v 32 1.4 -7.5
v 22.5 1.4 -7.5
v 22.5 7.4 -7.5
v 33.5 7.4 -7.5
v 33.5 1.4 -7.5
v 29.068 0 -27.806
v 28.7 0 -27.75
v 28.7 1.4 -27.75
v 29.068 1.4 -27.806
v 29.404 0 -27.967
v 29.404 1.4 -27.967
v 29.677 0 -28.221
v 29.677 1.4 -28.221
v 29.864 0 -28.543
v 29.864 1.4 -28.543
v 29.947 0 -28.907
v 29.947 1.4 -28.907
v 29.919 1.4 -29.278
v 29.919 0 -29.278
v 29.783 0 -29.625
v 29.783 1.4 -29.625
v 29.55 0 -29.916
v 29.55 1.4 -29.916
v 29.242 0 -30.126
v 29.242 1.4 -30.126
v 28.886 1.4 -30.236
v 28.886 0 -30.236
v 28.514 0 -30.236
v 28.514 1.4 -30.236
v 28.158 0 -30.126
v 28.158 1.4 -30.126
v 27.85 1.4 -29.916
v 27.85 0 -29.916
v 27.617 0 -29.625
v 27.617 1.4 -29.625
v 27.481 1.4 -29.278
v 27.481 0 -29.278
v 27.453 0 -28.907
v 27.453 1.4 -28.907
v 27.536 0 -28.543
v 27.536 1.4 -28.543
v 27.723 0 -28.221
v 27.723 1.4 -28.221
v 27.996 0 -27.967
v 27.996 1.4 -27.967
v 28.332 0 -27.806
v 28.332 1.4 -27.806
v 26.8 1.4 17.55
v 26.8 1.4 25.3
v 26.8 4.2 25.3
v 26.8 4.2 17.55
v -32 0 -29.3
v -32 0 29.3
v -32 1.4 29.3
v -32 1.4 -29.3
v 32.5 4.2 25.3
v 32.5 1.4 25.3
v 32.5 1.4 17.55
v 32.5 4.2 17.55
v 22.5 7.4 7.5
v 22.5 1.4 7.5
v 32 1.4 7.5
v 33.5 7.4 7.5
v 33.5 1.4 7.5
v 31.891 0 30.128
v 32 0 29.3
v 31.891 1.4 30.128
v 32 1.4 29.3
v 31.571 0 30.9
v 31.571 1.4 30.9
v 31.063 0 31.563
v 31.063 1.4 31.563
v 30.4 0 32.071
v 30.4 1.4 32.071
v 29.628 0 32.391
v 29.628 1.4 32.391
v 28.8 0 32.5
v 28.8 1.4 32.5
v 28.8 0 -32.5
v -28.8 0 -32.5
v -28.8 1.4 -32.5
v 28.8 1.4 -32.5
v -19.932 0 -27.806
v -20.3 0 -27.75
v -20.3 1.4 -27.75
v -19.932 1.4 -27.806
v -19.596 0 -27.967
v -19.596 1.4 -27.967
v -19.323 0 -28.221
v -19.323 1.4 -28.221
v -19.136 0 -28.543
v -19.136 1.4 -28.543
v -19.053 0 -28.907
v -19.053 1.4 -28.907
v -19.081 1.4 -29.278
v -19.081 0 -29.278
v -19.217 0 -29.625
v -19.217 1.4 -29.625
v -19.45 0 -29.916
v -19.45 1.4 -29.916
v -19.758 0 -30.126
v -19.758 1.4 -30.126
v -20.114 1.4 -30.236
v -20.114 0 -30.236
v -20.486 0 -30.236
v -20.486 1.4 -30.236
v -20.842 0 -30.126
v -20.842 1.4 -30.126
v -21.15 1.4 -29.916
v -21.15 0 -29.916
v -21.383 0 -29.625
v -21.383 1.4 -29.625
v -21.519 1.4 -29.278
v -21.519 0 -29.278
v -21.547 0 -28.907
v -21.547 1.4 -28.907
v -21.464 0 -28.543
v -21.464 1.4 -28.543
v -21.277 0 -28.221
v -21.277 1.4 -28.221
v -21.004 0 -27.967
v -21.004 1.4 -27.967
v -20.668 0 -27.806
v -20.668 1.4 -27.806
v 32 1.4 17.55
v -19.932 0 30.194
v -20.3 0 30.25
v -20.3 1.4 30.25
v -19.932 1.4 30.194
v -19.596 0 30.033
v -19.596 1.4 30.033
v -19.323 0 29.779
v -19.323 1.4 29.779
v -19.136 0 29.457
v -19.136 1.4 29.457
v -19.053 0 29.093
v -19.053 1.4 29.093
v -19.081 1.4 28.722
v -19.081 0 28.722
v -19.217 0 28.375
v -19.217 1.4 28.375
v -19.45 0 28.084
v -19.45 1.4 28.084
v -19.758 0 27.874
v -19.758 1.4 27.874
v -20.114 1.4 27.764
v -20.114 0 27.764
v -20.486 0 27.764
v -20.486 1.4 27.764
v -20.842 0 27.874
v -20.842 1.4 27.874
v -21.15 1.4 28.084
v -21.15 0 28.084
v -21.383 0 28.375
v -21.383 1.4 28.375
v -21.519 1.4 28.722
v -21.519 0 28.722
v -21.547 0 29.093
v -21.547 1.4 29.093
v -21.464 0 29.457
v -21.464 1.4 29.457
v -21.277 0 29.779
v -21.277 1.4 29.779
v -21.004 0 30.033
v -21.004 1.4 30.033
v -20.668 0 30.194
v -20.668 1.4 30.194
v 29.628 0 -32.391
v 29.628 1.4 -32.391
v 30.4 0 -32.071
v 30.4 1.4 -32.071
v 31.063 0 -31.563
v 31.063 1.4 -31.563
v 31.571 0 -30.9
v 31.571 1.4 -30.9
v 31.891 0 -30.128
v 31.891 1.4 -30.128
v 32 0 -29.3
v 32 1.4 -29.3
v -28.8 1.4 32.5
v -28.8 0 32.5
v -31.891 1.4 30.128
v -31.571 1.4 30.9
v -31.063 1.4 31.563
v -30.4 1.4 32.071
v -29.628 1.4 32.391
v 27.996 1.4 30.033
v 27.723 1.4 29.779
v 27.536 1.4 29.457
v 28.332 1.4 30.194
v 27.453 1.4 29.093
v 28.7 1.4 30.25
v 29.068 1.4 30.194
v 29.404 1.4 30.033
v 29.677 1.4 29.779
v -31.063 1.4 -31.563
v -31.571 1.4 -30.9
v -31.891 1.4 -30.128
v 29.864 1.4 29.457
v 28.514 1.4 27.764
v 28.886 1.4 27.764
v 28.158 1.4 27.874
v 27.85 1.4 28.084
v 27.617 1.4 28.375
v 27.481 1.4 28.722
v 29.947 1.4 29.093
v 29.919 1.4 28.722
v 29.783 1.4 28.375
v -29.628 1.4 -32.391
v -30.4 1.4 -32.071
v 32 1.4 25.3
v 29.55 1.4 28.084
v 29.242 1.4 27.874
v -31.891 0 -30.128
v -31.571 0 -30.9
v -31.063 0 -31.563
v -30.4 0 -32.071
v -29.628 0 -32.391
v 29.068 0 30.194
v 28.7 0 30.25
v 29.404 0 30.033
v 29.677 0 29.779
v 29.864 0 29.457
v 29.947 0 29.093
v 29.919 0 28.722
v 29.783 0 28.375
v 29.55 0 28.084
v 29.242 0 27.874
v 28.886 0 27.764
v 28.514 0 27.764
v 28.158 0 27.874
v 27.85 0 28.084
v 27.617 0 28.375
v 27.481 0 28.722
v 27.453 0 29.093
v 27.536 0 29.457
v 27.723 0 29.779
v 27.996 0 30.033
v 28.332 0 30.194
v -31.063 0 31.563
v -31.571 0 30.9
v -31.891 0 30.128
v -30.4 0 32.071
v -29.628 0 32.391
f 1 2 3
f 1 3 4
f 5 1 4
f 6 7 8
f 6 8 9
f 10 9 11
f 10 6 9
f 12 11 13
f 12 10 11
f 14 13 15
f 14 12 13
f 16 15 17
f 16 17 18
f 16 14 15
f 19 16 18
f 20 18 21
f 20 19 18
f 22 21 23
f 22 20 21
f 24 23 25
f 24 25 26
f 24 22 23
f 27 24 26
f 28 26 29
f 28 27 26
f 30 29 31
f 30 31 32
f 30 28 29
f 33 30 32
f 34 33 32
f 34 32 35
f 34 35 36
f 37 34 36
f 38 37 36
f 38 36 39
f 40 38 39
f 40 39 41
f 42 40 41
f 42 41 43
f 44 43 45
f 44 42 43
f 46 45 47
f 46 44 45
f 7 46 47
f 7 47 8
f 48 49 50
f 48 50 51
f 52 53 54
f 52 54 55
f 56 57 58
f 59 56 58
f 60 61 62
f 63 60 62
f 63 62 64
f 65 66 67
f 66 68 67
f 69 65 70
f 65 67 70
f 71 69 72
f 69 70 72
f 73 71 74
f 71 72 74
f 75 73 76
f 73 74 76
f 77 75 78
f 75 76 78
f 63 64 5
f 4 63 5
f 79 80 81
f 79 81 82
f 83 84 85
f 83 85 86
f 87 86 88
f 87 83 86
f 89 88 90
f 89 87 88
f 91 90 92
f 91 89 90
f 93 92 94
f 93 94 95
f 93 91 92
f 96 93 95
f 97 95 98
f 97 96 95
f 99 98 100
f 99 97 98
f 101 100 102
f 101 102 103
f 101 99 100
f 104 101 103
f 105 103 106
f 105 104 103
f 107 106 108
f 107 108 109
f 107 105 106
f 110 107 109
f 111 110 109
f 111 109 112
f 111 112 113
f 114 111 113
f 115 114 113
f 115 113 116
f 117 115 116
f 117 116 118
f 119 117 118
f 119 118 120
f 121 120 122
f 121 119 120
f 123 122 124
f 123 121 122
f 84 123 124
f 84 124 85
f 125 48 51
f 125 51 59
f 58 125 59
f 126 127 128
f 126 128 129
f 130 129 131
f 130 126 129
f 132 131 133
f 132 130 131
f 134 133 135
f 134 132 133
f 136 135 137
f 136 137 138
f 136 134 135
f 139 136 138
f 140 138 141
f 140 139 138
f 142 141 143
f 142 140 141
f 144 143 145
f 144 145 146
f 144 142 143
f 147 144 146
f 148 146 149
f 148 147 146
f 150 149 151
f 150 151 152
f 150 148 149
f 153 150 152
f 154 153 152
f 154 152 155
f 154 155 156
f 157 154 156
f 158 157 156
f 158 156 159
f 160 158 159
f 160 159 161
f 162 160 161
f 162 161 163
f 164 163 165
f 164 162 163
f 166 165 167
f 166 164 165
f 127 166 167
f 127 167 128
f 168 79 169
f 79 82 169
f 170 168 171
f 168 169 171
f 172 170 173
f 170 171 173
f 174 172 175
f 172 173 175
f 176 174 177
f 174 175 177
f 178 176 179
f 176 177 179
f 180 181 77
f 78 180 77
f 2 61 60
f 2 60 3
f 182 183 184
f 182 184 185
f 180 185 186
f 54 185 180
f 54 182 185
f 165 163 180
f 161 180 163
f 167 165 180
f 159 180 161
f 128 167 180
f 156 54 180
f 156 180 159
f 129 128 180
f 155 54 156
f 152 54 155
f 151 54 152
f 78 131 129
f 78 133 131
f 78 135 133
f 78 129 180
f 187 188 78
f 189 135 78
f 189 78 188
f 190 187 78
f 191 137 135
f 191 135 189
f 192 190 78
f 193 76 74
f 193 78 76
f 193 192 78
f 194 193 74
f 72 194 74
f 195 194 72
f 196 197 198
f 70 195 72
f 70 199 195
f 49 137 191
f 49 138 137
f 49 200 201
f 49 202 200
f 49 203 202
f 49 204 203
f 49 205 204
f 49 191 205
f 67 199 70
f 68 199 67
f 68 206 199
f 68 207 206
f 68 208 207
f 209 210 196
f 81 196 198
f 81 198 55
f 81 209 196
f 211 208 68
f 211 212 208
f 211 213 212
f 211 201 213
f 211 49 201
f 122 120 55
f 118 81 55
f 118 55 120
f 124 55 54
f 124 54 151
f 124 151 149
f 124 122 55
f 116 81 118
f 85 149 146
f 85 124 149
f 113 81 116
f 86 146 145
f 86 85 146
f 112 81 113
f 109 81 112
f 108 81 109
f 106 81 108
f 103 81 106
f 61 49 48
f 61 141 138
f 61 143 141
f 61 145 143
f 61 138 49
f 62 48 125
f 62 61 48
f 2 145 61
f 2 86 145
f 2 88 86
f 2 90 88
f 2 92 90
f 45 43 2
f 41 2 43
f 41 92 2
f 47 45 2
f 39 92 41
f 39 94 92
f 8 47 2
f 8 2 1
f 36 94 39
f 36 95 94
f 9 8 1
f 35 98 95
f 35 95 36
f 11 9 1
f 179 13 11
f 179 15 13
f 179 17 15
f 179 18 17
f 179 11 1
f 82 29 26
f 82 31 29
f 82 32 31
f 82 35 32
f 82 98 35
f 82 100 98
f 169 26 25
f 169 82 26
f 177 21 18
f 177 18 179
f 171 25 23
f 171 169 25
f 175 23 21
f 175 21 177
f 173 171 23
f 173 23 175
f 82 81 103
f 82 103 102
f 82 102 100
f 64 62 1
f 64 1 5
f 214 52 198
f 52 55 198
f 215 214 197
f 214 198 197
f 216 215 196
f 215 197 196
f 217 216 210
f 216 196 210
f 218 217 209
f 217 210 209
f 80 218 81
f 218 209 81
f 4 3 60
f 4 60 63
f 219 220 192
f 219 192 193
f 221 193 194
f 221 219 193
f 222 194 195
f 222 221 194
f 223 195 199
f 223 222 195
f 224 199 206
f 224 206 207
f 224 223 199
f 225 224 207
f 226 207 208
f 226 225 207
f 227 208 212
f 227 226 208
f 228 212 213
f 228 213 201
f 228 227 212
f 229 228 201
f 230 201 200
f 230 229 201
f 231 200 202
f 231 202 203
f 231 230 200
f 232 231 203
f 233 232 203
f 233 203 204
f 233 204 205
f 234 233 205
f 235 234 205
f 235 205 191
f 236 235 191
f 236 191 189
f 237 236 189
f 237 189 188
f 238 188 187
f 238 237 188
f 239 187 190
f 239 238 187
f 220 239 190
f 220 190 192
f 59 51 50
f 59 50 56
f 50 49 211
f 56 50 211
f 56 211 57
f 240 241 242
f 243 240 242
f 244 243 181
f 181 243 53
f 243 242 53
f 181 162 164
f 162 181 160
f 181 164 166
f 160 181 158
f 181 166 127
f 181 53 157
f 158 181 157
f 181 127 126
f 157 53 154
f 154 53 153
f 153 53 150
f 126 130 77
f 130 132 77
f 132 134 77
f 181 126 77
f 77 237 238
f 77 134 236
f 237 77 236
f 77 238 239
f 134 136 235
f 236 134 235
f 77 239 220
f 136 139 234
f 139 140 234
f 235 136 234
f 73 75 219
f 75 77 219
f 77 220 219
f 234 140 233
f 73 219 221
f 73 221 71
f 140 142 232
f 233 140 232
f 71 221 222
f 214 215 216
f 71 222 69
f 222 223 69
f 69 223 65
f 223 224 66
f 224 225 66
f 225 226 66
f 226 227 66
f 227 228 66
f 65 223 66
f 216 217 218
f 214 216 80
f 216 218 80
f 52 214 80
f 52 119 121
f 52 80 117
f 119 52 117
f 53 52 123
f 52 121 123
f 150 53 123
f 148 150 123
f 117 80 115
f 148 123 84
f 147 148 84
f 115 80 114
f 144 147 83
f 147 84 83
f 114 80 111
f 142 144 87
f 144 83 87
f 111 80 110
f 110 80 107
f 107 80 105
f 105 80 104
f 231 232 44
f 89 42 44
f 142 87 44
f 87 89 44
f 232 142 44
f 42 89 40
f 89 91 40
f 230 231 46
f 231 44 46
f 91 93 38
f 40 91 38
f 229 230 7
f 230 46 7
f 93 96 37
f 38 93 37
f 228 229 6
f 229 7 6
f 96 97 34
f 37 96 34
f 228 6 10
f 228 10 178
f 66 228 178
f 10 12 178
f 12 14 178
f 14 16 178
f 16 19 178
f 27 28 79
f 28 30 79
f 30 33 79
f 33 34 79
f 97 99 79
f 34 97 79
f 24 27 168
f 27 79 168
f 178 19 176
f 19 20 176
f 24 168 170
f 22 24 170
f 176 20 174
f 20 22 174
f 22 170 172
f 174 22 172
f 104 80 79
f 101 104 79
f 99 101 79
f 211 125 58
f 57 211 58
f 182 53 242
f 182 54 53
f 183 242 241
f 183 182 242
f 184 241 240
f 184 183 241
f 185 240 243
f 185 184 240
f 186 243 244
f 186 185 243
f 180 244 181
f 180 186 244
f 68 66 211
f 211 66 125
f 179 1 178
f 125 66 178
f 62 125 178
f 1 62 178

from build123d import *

# Parameters (mm, degrees)
SKETCH1_W           = 64
SKETCH1_H           = 65
SKETCH1_R           = 1.25
BOSS_EXTRUDE1_DEPTH = 1.4
SKETCH2_W           = 11
SKETCH2_H           = 15
BOSS_EXTRUDE2_DEPTH = 6
SKETCH3_W           = 5.7
SKETCH3_H           = 7.75
BOSS_EXTRUDE3_DEPTH = 2.8
FILLET1_R           = 3.2


with BuildPart() as part:
    # Sketch1 → Boss-Extrude1 (new body)
    with BuildSketch(Plane(origin=(0, 0, 0), x_dir=(1, 0, 0), z_dir=(0, 1, 0))):
        Rectangle(SKETCH1_W, SKETCH1_H)
        with Locations(Location((28.7, -29, 0), (0, 0, 270))):
            Circle(SKETCH1_R, mode=Mode.SUBTRACT)
        with Locations(Location((-20.3, -29, 0), (0, 0, 270))):
            Circle(SKETCH1_R, mode=Mode.SUBTRACT)
        with Locations(Location((-20.3, 29, 0), (0, 0, 270))):
            Circle(SKETCH1_R, mode=Mode.SUBTRACT)
        with Locations(Location((28.7, 29, 0), (0, 0, 270))):
            Circle(SKETCH1_R, mode=Mode.SUBTRACT)
    extrude(amount=BOSS_EXTRUDE1_DEPTH)

    # Sketch2 → Boss-Extrude2 (add)
    with BuildSketch(Plane(origin=(0, 1.4, 0), x_dir=(1, 0, 0), z_dir=(0, 1, 0))):
        with Locations((28, 0)):
            Rectangle(SKETCH2_W, SKETCH2_H)
    extrude(amount=BOSS_EXTRUDE2_DEPTH)

    # Sketch3 → Boss-Extrude3 (add)
    with BuildSketch(Plane(origin=(0, 1.4, 0), x_dir=(1, 0, 0), z_dir=(0, 1, 0))):
        with Locations((29.65, -21.425)):
            Rectangle(SKETCH3_W, SKETCH3_H)
    extrude(amount=BOSS_EXTRUDE3_DEPTH)

    # Fillet1
    fillet1_edges = [part.edges().sort_by_distance(p)[0] for p in [
        (32, 0.7, 32.5),
        (-32, 0.7, 32.5),
        (-32, 0.7, -32.5),
        (32, 0.7, -32.5),
    ]]
    fillet(fillet1_edges, radius=FILLET1_R)


solid = part.part
